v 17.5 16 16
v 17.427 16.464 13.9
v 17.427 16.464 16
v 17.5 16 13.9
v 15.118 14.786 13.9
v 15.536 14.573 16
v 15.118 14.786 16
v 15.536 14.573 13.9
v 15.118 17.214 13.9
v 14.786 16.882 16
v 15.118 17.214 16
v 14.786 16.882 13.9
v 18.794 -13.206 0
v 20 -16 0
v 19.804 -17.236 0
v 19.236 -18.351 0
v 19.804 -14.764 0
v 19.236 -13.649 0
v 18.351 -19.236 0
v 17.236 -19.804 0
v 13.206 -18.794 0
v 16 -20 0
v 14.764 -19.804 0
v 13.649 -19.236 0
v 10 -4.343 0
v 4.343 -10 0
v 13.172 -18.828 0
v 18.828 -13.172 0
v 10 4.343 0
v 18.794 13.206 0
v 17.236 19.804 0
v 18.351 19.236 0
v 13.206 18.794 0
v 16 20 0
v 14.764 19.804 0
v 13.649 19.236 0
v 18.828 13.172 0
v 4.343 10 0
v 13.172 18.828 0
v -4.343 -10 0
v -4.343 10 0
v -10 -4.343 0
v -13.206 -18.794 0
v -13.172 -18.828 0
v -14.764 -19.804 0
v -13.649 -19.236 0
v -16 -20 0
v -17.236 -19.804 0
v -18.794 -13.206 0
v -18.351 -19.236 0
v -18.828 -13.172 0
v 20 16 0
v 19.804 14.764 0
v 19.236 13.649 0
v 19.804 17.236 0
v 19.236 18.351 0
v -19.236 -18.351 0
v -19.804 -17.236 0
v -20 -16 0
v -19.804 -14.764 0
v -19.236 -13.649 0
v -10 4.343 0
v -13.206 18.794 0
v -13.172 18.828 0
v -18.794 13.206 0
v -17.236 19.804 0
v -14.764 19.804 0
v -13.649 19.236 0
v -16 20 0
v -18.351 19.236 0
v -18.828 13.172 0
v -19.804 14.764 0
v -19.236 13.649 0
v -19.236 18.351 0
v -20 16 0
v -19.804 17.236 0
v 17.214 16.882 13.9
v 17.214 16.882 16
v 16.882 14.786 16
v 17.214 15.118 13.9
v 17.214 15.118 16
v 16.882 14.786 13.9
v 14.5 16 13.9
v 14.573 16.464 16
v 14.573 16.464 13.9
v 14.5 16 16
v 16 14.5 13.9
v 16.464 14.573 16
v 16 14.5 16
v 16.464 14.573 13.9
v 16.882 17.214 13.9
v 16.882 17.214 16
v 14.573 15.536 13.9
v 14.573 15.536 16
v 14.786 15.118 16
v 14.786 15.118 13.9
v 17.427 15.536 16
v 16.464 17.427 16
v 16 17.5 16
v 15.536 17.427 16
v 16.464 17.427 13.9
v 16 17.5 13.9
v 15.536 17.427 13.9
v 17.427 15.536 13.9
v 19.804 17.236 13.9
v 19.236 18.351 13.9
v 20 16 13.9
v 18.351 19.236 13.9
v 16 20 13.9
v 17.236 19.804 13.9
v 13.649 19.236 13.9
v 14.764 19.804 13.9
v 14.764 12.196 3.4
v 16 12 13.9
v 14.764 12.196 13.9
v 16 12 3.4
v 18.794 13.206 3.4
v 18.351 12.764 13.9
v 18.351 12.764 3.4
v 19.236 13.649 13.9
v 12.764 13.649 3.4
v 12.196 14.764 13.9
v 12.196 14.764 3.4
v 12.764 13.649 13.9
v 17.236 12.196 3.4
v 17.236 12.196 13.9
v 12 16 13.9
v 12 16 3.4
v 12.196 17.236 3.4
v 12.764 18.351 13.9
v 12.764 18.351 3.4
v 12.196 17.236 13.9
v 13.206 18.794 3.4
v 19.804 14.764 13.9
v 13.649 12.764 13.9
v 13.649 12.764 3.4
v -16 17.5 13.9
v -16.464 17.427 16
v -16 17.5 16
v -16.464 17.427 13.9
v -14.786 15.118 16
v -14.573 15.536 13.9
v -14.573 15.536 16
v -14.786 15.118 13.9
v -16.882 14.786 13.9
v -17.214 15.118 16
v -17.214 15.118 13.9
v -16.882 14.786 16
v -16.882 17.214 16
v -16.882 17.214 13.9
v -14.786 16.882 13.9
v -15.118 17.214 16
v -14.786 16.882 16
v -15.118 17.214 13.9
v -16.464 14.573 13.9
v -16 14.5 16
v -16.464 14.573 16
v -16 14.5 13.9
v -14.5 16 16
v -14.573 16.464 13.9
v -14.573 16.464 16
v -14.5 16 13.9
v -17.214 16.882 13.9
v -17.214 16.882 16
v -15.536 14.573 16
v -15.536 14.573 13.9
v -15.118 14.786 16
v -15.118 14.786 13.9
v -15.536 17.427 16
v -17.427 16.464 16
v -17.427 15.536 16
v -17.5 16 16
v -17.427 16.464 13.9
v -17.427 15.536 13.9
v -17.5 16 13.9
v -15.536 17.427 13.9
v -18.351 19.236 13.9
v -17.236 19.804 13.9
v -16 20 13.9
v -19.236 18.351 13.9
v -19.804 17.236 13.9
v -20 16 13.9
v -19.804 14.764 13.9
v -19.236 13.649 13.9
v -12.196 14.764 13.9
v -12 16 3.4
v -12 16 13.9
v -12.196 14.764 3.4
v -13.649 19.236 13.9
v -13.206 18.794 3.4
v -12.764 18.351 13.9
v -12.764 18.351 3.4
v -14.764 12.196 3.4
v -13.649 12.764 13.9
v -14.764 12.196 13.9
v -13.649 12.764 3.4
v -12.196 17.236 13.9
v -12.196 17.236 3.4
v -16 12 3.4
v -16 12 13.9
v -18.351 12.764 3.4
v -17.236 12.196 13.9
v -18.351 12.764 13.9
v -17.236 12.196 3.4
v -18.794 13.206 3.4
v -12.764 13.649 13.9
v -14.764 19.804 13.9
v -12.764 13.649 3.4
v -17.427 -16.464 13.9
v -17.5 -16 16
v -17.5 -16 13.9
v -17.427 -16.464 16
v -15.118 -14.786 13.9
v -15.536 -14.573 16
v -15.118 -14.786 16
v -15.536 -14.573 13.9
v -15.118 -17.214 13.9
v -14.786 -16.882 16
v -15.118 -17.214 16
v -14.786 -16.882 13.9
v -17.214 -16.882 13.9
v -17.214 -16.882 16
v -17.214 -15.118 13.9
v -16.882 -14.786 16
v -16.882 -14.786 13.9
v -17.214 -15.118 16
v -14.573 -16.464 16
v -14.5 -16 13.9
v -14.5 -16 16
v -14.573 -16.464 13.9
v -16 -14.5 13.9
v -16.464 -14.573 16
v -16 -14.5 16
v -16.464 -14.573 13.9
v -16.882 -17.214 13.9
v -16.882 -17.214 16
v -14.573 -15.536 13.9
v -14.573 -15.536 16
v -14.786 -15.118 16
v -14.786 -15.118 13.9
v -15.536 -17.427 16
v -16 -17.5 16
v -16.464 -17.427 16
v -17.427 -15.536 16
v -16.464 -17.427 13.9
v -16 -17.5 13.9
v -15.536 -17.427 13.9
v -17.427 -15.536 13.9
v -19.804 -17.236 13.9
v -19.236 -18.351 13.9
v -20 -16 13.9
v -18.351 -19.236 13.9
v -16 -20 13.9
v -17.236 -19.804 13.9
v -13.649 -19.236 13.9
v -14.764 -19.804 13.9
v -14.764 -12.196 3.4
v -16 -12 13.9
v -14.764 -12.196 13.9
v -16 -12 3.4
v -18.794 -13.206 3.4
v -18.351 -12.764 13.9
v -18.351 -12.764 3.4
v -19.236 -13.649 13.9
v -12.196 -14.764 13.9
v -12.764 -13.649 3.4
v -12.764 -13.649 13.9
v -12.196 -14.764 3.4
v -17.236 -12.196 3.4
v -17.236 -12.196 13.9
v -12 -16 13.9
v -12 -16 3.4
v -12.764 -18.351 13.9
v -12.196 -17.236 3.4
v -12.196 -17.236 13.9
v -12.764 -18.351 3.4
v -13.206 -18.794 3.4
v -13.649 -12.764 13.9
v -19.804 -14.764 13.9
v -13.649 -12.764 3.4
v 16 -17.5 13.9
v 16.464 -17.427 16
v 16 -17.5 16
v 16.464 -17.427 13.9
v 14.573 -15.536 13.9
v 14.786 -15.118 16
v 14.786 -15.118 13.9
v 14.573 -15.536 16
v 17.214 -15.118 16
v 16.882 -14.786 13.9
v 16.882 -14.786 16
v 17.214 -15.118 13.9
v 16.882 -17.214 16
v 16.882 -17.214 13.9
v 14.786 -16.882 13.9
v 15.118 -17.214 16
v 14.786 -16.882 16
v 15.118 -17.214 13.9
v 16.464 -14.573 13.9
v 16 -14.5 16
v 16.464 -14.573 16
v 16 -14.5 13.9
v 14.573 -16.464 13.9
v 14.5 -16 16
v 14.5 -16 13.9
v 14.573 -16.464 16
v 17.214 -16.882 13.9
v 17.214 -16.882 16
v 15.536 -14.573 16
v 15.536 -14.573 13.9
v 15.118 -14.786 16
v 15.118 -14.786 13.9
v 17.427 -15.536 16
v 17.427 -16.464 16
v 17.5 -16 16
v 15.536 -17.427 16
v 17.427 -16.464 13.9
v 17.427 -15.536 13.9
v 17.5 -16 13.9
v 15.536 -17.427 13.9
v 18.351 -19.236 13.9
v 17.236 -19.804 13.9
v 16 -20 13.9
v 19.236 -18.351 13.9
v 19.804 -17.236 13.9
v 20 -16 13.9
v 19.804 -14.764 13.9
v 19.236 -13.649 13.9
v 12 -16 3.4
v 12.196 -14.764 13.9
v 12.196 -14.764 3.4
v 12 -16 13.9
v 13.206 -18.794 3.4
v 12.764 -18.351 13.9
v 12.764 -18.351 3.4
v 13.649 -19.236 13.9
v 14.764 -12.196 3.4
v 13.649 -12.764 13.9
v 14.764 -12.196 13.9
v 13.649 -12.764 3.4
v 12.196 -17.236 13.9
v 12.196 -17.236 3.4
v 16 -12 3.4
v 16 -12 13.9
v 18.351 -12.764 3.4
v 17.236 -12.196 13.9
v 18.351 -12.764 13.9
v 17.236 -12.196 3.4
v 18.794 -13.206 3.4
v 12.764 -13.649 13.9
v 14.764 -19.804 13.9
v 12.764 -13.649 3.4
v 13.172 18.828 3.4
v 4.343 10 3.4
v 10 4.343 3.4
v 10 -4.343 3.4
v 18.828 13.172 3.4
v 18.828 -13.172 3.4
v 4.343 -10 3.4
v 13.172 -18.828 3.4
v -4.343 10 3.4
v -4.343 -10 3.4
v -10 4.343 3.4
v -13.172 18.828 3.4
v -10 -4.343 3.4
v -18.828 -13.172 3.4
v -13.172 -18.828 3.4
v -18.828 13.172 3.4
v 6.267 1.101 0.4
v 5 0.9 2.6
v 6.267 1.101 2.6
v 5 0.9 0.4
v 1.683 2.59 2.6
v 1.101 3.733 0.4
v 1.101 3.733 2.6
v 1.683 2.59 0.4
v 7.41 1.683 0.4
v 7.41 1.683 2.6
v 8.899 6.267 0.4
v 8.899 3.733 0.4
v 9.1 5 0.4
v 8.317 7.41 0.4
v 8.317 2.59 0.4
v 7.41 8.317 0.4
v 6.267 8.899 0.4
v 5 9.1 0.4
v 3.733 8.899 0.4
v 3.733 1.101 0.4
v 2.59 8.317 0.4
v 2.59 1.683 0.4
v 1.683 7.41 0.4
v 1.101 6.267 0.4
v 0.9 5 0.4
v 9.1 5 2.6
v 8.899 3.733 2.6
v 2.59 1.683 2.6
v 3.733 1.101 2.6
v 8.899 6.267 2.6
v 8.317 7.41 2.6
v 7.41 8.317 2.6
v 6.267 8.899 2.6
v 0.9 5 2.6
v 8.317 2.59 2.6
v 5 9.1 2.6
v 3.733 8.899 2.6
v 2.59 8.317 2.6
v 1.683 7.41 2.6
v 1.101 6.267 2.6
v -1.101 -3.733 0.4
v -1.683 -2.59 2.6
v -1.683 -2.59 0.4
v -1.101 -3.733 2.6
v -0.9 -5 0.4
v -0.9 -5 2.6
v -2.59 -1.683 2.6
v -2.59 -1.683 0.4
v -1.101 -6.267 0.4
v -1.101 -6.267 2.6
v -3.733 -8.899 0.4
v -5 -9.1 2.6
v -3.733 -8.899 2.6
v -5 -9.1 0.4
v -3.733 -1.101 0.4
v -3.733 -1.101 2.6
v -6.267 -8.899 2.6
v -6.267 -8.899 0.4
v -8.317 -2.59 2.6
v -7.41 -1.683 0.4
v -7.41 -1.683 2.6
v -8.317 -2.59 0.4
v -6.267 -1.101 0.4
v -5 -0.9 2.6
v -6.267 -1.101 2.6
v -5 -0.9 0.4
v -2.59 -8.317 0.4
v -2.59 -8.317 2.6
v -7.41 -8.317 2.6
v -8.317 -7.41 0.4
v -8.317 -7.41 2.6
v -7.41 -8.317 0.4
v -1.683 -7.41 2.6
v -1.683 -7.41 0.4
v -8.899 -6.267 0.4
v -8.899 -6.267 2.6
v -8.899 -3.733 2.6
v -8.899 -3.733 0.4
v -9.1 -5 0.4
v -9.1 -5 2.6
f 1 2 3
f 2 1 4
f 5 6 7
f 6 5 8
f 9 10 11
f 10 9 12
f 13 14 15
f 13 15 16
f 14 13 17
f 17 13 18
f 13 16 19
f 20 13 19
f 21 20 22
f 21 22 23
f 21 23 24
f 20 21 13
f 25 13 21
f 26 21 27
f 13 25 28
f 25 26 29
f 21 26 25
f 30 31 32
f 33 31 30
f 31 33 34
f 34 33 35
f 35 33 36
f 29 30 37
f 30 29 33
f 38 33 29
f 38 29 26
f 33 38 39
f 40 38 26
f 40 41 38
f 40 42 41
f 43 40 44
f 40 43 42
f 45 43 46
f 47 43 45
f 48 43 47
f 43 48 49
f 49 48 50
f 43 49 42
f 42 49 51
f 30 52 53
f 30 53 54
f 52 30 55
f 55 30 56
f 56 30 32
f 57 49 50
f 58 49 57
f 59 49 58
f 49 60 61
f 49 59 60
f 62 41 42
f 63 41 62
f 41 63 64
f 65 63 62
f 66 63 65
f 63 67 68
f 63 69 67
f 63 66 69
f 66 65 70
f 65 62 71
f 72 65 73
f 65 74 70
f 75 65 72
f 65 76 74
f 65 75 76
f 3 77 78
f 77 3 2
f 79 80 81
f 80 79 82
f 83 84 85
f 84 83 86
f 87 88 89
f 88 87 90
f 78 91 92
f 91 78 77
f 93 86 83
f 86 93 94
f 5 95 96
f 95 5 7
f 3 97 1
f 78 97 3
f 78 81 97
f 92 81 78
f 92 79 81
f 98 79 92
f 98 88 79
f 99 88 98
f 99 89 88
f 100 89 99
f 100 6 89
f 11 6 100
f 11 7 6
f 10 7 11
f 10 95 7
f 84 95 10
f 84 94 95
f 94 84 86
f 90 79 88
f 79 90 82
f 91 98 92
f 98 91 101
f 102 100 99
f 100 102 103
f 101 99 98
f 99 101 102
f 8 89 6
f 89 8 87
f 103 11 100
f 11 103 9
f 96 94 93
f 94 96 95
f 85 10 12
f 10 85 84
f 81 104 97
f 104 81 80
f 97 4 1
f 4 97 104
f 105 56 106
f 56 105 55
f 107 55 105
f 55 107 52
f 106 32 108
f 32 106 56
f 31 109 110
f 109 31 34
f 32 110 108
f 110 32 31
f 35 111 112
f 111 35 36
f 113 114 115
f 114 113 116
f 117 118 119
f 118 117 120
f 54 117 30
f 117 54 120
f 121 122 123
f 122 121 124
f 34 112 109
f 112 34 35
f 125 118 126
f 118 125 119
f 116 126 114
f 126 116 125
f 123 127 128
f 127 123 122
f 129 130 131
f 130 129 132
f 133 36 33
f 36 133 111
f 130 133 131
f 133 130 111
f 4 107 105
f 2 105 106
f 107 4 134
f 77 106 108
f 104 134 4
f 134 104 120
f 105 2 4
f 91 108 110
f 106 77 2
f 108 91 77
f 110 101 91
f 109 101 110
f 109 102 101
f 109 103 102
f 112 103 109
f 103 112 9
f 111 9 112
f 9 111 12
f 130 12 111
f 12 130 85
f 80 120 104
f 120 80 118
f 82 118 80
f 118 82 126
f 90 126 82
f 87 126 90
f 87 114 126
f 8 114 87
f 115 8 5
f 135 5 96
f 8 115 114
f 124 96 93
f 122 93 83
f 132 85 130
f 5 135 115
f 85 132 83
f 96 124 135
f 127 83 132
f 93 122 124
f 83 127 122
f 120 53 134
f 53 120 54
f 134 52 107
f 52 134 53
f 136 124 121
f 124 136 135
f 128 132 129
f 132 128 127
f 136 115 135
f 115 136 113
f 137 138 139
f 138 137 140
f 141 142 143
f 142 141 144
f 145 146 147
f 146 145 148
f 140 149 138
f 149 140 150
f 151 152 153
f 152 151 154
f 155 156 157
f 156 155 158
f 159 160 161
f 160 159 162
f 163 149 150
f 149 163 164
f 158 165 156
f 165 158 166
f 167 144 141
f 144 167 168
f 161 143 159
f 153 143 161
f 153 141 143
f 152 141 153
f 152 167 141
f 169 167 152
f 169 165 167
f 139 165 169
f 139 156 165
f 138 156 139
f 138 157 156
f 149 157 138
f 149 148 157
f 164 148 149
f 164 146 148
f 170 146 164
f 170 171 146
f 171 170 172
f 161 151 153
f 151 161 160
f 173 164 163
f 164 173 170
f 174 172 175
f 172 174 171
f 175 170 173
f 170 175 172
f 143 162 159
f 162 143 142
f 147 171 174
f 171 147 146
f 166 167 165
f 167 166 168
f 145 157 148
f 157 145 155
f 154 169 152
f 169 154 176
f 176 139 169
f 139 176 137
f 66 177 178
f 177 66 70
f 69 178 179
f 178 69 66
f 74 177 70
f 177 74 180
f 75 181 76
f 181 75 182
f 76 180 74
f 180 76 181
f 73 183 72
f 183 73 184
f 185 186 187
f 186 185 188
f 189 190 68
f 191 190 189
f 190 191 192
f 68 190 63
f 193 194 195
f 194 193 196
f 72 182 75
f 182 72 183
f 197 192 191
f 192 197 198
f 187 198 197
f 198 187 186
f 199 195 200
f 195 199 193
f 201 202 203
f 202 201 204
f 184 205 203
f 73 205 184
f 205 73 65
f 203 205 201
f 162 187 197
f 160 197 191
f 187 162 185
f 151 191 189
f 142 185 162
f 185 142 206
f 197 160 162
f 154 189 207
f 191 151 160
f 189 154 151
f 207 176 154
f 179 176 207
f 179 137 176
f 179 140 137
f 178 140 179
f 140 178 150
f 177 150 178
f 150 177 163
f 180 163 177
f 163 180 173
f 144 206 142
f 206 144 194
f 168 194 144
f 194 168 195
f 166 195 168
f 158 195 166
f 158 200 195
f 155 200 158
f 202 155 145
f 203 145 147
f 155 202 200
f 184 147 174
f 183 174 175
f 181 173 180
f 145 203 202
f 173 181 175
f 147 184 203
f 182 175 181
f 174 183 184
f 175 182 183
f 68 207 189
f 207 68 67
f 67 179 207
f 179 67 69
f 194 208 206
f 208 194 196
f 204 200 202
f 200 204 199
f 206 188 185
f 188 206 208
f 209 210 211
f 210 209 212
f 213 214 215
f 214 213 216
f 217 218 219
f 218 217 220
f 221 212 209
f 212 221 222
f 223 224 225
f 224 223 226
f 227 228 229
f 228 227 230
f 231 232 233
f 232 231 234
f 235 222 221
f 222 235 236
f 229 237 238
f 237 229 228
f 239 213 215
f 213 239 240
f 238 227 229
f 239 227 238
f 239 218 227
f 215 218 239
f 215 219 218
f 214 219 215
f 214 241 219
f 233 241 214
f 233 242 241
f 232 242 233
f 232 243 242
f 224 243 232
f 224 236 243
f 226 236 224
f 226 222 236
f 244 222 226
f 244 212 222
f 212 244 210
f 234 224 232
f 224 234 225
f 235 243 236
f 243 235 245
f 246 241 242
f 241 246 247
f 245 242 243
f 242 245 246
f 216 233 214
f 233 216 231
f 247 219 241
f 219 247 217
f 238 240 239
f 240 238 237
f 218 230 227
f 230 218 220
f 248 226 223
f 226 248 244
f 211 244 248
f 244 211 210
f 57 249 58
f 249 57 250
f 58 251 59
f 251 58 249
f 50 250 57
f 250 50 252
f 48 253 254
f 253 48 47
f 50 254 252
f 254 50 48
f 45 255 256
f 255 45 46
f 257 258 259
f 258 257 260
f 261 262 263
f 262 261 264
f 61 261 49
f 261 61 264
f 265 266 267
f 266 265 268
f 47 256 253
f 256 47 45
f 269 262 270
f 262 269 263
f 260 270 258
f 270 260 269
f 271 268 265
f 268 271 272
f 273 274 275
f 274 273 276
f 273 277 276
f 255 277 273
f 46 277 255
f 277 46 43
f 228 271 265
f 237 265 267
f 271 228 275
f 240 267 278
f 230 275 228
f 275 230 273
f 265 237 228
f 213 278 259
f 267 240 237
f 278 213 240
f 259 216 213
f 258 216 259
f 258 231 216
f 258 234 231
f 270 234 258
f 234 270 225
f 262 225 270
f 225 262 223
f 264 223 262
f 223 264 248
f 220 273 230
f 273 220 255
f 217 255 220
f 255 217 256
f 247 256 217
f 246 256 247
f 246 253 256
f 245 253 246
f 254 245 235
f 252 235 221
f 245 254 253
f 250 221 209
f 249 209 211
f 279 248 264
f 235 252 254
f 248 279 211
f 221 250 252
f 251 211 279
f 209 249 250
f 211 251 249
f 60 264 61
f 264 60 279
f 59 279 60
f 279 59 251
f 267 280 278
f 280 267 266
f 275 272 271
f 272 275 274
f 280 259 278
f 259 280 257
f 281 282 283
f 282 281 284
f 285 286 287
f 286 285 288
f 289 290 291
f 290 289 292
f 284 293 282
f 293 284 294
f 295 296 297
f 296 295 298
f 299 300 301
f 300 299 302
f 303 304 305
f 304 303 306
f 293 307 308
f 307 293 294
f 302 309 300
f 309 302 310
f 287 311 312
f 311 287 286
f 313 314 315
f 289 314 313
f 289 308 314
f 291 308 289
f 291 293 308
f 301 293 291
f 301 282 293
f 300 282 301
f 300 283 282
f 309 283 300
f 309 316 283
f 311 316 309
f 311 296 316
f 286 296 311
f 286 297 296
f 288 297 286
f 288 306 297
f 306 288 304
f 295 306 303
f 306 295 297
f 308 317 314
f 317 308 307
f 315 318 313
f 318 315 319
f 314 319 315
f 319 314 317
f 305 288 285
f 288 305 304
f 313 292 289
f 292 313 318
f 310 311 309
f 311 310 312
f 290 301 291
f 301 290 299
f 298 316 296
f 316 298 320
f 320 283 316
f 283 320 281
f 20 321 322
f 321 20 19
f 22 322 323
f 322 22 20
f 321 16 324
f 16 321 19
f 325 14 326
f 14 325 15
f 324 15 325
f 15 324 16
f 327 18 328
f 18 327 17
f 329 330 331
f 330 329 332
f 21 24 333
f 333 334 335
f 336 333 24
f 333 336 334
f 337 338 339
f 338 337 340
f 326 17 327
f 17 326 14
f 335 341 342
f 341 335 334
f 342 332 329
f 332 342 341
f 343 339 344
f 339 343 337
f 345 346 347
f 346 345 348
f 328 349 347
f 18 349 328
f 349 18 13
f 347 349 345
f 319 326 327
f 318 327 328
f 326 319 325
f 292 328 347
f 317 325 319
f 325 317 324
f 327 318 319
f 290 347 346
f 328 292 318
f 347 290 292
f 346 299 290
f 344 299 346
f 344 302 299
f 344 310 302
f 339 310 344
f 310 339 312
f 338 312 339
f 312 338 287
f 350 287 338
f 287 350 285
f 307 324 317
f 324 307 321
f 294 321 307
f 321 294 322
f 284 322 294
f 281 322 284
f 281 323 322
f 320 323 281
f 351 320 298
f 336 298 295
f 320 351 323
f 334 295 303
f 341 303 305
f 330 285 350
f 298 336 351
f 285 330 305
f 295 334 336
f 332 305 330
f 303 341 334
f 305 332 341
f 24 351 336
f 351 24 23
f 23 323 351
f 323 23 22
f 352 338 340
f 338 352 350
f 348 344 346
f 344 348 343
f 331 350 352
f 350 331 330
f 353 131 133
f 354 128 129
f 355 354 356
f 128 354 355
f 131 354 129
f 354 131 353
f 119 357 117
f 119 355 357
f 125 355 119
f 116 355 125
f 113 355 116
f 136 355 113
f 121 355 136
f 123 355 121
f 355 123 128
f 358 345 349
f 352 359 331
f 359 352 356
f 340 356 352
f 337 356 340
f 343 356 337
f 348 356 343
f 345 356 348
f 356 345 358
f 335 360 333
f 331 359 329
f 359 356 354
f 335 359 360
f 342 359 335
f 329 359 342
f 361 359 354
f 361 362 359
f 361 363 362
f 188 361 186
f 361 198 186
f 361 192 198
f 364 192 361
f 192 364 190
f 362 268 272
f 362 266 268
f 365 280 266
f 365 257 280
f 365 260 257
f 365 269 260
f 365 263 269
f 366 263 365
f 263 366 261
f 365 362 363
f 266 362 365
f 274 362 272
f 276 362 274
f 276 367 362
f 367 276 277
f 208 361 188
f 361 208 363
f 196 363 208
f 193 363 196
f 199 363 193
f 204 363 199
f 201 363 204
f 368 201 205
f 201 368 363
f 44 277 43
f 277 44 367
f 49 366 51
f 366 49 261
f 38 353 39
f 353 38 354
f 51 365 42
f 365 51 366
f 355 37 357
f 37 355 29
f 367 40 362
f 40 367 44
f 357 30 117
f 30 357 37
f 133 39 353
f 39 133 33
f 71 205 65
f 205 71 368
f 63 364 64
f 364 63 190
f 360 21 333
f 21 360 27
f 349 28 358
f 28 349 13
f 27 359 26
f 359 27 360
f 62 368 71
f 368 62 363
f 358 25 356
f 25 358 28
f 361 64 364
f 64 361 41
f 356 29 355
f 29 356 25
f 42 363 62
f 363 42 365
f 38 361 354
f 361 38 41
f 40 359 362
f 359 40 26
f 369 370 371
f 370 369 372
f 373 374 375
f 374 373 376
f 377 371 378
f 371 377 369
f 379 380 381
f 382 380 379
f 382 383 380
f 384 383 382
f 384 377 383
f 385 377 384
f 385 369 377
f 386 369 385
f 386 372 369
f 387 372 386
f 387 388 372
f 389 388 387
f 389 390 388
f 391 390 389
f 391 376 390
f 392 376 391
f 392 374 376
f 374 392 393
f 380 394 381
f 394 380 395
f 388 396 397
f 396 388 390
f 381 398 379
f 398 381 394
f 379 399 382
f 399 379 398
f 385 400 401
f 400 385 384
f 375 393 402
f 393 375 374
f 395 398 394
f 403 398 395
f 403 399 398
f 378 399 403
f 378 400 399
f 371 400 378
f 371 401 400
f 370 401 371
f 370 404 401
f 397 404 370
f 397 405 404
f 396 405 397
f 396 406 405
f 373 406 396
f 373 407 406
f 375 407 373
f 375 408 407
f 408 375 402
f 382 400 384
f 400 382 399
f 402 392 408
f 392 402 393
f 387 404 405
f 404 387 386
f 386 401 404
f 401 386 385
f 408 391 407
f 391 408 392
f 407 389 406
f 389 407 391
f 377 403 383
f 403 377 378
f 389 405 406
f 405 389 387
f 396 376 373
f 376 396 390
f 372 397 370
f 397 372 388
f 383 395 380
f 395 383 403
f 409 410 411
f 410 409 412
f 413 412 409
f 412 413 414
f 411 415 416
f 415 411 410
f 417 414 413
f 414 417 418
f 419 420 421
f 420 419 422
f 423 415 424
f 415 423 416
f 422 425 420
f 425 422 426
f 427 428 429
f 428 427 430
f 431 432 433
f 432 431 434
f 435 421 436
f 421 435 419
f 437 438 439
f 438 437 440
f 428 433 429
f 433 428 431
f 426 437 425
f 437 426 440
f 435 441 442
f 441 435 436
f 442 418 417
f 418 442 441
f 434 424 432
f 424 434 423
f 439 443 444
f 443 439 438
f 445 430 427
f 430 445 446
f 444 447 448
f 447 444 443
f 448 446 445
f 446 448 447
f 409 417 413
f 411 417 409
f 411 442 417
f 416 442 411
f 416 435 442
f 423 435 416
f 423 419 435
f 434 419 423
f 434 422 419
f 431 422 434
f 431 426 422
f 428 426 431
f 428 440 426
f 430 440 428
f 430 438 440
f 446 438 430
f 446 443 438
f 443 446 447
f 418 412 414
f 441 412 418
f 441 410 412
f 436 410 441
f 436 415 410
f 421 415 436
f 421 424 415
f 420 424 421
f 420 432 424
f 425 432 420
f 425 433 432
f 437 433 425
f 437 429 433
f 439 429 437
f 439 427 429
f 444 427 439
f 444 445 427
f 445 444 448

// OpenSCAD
include <BOSL/constants.scad>
use <BOSL/shapes.scad>

nozzle_width=0.4;
wall_w=4*nozzle_width;

bottom_h=1.6;
stand_bottom=3.4;

$fn=20;
// -------

//wemos_soldering_socket();
soldering_stand();

// --------
module wemos_soldering_socket() {
    l=20.8;
    w=2.35;
    h=8.45;

    li=20;
    wi=0.8;
    hi=1;

    ho=h+hi;
    wo=w+2*wall_w;
    lo=l+2*wall_w;

    socket_w=22.86;

    
    
    module pins() {
        union() {
            translate([0, 0, hi]) union() {
                upcube([l, w, h]);
                translate([0, 0, h*2/3]) hull() {
                    translate([0, 0, -1])upcube([l, w, 1]);
                    upcube([l+2, w, 1]);
                }
                translate([0, 0, h]) hull() {
                    translate([0, 0, -1])upcube([l, w, 1]);
                    upcube([l+2, w+1, 1]);
                }
            }
            upcube([li, wi, hi]);
        }
    }

    module socket_mass() {
        union() {
            hull() {
                cuboid([lo, wo, ho*2/3], edges=EDGES_ALL, align=V_TOP, fillet=1);
                cuboid([lo/2, wo, ho], edges=EDGES_ALL, align=V_TOP, fillet=1);
            }
        }
    }


    difference() {
        union() {
            cuboid([40, 40, bottom_h], edges=EDGES_Z_ALL, align=V_TOP, fillet=4);
            translate([0, socket_w/2, 0]) socket_mass();
            translate([0, -socket_w/2, 0])  socket_mass();

        }
        translate([0, socket_w/2, 0]) pins();
        translate([0, -socket_w/2, 0]) pins();
        cuboid([lo, socket_w-wo, bottom_h], edges=EDGES_Z_ALL, align=V_TOP, fillet=1);
        
        for (rz=[0 : 90 : 359]) {
            rotate([0, 0, rz]) translate([16, 16, 0]) union() {
                translate([0, 0, .4]) cylinder(r=1.6, h=bottom_h-.8);
                hull() {
                    translate([0, 0, .4]) cylinder(r=1.6, h=.1);
                    translate([0, 0, -.1]) cylinder(r=1.8, h=.1);
                }
                hull() {
                    translate([0, 0, bottom_h-.5]) cylinder(r=1.6, h=.1);
                    translate([0, 0, bottom_h]) cylinder(r=1.8, h=.1);
                }
            }
        }
    }
}

module soldering_stand() {
    h=10.5;
    
    difference() {
        union() {
            for (rz=[0 : 90 : 359]) {
                rotate([0, 0, rz]) translate([16, 16, 0]) {
                    cylinder(r=1.5, h=h+.5+stand_bottom+bottom_h);
                    cylinder(r=4, h=h+stand_bottom);
                }
            }
            for (rz=[45 : 90 : 270]) {
                rotate([0, 0, rz]) upcube([sqrt(2*32*32), 8, stand_bottom]);
            }
            upcube([20, 20, stand_bottom]);
        }
        translate([5, 5, .4]) cylinder(d=8.2, h=2.2, $fn=20);
        translate([-5, -5, .4]) cylinder(d=8.2, h=2.2, $fn=20);
    }
}
